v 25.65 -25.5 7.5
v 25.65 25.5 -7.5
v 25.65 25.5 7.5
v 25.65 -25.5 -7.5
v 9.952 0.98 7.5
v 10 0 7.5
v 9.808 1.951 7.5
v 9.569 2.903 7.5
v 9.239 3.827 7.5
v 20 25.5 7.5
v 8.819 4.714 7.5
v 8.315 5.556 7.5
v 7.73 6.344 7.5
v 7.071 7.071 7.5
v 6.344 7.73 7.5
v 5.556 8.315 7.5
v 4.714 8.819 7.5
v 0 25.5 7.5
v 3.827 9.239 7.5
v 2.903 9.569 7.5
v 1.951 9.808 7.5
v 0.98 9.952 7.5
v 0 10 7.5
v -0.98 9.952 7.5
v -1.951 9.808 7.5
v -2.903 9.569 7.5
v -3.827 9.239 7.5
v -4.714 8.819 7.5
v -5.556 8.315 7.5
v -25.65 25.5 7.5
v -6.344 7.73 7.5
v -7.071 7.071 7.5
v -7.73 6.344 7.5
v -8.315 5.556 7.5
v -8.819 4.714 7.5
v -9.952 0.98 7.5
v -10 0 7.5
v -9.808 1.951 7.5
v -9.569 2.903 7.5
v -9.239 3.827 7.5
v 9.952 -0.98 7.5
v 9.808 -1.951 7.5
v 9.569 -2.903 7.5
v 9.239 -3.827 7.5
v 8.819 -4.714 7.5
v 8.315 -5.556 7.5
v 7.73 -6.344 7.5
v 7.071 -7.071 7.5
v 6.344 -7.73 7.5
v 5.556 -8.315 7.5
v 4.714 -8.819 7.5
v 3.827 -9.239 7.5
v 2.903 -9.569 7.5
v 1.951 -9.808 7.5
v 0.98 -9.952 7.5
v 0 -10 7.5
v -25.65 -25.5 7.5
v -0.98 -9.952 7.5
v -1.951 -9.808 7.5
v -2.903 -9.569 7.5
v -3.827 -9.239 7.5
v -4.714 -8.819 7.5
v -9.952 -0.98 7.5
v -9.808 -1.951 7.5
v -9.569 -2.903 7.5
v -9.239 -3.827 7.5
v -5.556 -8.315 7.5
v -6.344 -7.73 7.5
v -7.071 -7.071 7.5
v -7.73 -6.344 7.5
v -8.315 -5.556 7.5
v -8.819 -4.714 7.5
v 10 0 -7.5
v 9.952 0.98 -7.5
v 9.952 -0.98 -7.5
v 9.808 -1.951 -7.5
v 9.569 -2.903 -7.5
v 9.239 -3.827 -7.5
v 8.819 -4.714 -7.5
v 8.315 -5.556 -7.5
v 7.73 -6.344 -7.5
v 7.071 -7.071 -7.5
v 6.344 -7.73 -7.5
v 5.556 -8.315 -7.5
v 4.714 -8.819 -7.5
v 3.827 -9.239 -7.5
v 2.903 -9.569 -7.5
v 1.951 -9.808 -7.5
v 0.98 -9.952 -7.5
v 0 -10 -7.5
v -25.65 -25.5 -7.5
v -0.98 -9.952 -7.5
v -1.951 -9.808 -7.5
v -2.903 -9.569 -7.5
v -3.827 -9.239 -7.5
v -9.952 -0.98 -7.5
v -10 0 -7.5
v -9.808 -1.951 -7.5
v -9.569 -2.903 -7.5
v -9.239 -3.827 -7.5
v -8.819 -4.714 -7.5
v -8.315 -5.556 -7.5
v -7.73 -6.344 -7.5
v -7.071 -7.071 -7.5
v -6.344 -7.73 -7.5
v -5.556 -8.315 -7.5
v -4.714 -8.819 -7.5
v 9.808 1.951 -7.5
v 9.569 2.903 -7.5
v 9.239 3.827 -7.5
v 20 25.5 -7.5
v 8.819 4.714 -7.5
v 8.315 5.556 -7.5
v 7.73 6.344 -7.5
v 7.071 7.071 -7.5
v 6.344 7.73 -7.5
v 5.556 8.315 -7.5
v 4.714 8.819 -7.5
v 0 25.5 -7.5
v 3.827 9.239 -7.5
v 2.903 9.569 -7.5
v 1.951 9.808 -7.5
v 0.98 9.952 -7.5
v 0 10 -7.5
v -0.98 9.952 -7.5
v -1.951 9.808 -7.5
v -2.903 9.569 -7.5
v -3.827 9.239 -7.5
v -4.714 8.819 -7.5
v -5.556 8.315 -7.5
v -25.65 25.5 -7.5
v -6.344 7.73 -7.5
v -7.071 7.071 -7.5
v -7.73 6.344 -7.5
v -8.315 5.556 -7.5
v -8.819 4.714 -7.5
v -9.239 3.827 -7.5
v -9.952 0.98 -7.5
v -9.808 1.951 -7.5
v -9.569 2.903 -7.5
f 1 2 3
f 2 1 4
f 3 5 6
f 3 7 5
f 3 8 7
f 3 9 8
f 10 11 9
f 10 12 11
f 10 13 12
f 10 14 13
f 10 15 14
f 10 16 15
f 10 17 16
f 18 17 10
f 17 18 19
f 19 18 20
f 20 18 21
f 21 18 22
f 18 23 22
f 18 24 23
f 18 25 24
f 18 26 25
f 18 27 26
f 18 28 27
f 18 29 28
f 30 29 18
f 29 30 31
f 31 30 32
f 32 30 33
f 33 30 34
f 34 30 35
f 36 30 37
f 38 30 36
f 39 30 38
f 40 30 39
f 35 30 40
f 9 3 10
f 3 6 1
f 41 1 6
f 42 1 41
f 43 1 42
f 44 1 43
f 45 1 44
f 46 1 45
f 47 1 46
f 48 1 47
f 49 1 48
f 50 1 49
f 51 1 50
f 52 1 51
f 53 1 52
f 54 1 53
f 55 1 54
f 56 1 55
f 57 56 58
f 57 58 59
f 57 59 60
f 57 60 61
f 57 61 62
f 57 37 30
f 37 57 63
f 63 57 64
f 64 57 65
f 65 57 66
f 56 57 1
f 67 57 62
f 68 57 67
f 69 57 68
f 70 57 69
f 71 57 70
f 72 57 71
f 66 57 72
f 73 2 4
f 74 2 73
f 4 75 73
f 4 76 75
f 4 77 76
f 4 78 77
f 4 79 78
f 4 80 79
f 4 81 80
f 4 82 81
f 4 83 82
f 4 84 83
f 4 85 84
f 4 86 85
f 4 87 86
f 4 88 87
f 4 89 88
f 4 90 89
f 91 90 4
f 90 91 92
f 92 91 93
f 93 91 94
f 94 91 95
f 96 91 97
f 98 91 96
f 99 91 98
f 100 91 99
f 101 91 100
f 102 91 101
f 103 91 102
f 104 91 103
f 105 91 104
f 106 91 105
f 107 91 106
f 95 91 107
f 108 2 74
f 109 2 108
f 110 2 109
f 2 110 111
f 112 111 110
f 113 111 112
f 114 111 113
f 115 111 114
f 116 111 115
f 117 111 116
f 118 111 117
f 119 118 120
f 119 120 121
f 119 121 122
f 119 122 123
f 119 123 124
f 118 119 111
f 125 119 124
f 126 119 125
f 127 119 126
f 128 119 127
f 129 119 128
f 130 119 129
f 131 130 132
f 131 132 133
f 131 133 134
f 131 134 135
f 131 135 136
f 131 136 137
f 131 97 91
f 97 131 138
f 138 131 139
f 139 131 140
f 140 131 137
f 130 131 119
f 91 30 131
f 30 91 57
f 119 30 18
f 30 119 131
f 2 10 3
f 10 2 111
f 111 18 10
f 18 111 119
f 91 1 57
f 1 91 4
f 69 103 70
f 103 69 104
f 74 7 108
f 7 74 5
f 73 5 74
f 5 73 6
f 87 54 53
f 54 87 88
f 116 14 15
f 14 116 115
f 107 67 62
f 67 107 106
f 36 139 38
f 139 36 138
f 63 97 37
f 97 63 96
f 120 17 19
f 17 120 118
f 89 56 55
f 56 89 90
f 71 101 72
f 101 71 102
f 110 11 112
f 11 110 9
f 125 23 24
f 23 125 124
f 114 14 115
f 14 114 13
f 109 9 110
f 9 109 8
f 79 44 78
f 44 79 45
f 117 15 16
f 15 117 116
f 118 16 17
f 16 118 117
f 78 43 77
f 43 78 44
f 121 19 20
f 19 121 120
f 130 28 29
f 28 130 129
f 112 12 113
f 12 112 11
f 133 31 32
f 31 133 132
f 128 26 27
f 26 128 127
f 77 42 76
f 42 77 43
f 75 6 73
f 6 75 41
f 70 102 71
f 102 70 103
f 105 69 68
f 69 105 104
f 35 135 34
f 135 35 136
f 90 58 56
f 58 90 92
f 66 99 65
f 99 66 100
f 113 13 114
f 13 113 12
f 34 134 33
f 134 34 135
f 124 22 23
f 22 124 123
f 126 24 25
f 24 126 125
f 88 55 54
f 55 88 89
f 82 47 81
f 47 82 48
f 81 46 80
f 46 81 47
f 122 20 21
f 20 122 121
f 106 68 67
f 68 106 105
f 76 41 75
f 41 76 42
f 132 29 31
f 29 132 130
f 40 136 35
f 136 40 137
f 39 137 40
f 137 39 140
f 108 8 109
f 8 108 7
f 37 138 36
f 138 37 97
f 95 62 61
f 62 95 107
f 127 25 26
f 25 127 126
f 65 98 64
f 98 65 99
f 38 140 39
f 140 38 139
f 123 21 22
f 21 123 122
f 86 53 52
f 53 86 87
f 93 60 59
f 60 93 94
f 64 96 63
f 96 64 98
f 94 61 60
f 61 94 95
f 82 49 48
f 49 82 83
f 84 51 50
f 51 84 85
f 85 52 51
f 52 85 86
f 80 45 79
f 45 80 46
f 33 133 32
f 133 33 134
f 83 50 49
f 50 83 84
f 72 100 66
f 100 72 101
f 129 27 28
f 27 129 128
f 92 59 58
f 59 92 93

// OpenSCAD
module centrifugal_blower_fan() {
    difference() {
        // Main body of the blower
        translate([-25.65, -25.5, -7.5])
            cube([51.3, 51.0, 15.0]);

        // Air outlet
        translate([0, 25.5, -7.5])
            cube([20.0, 10.0, 15.0]);

        // Inner cylinder for the fan
        translate([0, 0, -7.5])
            cylinder(h=15.0, r=10.0, $fn=64);

        // Central hole
        translate([0, 0, -7.5])
            cylinder(h=15.0, r=3.0, $fn=64);
    }
}

centrifugal_blower_fan();
